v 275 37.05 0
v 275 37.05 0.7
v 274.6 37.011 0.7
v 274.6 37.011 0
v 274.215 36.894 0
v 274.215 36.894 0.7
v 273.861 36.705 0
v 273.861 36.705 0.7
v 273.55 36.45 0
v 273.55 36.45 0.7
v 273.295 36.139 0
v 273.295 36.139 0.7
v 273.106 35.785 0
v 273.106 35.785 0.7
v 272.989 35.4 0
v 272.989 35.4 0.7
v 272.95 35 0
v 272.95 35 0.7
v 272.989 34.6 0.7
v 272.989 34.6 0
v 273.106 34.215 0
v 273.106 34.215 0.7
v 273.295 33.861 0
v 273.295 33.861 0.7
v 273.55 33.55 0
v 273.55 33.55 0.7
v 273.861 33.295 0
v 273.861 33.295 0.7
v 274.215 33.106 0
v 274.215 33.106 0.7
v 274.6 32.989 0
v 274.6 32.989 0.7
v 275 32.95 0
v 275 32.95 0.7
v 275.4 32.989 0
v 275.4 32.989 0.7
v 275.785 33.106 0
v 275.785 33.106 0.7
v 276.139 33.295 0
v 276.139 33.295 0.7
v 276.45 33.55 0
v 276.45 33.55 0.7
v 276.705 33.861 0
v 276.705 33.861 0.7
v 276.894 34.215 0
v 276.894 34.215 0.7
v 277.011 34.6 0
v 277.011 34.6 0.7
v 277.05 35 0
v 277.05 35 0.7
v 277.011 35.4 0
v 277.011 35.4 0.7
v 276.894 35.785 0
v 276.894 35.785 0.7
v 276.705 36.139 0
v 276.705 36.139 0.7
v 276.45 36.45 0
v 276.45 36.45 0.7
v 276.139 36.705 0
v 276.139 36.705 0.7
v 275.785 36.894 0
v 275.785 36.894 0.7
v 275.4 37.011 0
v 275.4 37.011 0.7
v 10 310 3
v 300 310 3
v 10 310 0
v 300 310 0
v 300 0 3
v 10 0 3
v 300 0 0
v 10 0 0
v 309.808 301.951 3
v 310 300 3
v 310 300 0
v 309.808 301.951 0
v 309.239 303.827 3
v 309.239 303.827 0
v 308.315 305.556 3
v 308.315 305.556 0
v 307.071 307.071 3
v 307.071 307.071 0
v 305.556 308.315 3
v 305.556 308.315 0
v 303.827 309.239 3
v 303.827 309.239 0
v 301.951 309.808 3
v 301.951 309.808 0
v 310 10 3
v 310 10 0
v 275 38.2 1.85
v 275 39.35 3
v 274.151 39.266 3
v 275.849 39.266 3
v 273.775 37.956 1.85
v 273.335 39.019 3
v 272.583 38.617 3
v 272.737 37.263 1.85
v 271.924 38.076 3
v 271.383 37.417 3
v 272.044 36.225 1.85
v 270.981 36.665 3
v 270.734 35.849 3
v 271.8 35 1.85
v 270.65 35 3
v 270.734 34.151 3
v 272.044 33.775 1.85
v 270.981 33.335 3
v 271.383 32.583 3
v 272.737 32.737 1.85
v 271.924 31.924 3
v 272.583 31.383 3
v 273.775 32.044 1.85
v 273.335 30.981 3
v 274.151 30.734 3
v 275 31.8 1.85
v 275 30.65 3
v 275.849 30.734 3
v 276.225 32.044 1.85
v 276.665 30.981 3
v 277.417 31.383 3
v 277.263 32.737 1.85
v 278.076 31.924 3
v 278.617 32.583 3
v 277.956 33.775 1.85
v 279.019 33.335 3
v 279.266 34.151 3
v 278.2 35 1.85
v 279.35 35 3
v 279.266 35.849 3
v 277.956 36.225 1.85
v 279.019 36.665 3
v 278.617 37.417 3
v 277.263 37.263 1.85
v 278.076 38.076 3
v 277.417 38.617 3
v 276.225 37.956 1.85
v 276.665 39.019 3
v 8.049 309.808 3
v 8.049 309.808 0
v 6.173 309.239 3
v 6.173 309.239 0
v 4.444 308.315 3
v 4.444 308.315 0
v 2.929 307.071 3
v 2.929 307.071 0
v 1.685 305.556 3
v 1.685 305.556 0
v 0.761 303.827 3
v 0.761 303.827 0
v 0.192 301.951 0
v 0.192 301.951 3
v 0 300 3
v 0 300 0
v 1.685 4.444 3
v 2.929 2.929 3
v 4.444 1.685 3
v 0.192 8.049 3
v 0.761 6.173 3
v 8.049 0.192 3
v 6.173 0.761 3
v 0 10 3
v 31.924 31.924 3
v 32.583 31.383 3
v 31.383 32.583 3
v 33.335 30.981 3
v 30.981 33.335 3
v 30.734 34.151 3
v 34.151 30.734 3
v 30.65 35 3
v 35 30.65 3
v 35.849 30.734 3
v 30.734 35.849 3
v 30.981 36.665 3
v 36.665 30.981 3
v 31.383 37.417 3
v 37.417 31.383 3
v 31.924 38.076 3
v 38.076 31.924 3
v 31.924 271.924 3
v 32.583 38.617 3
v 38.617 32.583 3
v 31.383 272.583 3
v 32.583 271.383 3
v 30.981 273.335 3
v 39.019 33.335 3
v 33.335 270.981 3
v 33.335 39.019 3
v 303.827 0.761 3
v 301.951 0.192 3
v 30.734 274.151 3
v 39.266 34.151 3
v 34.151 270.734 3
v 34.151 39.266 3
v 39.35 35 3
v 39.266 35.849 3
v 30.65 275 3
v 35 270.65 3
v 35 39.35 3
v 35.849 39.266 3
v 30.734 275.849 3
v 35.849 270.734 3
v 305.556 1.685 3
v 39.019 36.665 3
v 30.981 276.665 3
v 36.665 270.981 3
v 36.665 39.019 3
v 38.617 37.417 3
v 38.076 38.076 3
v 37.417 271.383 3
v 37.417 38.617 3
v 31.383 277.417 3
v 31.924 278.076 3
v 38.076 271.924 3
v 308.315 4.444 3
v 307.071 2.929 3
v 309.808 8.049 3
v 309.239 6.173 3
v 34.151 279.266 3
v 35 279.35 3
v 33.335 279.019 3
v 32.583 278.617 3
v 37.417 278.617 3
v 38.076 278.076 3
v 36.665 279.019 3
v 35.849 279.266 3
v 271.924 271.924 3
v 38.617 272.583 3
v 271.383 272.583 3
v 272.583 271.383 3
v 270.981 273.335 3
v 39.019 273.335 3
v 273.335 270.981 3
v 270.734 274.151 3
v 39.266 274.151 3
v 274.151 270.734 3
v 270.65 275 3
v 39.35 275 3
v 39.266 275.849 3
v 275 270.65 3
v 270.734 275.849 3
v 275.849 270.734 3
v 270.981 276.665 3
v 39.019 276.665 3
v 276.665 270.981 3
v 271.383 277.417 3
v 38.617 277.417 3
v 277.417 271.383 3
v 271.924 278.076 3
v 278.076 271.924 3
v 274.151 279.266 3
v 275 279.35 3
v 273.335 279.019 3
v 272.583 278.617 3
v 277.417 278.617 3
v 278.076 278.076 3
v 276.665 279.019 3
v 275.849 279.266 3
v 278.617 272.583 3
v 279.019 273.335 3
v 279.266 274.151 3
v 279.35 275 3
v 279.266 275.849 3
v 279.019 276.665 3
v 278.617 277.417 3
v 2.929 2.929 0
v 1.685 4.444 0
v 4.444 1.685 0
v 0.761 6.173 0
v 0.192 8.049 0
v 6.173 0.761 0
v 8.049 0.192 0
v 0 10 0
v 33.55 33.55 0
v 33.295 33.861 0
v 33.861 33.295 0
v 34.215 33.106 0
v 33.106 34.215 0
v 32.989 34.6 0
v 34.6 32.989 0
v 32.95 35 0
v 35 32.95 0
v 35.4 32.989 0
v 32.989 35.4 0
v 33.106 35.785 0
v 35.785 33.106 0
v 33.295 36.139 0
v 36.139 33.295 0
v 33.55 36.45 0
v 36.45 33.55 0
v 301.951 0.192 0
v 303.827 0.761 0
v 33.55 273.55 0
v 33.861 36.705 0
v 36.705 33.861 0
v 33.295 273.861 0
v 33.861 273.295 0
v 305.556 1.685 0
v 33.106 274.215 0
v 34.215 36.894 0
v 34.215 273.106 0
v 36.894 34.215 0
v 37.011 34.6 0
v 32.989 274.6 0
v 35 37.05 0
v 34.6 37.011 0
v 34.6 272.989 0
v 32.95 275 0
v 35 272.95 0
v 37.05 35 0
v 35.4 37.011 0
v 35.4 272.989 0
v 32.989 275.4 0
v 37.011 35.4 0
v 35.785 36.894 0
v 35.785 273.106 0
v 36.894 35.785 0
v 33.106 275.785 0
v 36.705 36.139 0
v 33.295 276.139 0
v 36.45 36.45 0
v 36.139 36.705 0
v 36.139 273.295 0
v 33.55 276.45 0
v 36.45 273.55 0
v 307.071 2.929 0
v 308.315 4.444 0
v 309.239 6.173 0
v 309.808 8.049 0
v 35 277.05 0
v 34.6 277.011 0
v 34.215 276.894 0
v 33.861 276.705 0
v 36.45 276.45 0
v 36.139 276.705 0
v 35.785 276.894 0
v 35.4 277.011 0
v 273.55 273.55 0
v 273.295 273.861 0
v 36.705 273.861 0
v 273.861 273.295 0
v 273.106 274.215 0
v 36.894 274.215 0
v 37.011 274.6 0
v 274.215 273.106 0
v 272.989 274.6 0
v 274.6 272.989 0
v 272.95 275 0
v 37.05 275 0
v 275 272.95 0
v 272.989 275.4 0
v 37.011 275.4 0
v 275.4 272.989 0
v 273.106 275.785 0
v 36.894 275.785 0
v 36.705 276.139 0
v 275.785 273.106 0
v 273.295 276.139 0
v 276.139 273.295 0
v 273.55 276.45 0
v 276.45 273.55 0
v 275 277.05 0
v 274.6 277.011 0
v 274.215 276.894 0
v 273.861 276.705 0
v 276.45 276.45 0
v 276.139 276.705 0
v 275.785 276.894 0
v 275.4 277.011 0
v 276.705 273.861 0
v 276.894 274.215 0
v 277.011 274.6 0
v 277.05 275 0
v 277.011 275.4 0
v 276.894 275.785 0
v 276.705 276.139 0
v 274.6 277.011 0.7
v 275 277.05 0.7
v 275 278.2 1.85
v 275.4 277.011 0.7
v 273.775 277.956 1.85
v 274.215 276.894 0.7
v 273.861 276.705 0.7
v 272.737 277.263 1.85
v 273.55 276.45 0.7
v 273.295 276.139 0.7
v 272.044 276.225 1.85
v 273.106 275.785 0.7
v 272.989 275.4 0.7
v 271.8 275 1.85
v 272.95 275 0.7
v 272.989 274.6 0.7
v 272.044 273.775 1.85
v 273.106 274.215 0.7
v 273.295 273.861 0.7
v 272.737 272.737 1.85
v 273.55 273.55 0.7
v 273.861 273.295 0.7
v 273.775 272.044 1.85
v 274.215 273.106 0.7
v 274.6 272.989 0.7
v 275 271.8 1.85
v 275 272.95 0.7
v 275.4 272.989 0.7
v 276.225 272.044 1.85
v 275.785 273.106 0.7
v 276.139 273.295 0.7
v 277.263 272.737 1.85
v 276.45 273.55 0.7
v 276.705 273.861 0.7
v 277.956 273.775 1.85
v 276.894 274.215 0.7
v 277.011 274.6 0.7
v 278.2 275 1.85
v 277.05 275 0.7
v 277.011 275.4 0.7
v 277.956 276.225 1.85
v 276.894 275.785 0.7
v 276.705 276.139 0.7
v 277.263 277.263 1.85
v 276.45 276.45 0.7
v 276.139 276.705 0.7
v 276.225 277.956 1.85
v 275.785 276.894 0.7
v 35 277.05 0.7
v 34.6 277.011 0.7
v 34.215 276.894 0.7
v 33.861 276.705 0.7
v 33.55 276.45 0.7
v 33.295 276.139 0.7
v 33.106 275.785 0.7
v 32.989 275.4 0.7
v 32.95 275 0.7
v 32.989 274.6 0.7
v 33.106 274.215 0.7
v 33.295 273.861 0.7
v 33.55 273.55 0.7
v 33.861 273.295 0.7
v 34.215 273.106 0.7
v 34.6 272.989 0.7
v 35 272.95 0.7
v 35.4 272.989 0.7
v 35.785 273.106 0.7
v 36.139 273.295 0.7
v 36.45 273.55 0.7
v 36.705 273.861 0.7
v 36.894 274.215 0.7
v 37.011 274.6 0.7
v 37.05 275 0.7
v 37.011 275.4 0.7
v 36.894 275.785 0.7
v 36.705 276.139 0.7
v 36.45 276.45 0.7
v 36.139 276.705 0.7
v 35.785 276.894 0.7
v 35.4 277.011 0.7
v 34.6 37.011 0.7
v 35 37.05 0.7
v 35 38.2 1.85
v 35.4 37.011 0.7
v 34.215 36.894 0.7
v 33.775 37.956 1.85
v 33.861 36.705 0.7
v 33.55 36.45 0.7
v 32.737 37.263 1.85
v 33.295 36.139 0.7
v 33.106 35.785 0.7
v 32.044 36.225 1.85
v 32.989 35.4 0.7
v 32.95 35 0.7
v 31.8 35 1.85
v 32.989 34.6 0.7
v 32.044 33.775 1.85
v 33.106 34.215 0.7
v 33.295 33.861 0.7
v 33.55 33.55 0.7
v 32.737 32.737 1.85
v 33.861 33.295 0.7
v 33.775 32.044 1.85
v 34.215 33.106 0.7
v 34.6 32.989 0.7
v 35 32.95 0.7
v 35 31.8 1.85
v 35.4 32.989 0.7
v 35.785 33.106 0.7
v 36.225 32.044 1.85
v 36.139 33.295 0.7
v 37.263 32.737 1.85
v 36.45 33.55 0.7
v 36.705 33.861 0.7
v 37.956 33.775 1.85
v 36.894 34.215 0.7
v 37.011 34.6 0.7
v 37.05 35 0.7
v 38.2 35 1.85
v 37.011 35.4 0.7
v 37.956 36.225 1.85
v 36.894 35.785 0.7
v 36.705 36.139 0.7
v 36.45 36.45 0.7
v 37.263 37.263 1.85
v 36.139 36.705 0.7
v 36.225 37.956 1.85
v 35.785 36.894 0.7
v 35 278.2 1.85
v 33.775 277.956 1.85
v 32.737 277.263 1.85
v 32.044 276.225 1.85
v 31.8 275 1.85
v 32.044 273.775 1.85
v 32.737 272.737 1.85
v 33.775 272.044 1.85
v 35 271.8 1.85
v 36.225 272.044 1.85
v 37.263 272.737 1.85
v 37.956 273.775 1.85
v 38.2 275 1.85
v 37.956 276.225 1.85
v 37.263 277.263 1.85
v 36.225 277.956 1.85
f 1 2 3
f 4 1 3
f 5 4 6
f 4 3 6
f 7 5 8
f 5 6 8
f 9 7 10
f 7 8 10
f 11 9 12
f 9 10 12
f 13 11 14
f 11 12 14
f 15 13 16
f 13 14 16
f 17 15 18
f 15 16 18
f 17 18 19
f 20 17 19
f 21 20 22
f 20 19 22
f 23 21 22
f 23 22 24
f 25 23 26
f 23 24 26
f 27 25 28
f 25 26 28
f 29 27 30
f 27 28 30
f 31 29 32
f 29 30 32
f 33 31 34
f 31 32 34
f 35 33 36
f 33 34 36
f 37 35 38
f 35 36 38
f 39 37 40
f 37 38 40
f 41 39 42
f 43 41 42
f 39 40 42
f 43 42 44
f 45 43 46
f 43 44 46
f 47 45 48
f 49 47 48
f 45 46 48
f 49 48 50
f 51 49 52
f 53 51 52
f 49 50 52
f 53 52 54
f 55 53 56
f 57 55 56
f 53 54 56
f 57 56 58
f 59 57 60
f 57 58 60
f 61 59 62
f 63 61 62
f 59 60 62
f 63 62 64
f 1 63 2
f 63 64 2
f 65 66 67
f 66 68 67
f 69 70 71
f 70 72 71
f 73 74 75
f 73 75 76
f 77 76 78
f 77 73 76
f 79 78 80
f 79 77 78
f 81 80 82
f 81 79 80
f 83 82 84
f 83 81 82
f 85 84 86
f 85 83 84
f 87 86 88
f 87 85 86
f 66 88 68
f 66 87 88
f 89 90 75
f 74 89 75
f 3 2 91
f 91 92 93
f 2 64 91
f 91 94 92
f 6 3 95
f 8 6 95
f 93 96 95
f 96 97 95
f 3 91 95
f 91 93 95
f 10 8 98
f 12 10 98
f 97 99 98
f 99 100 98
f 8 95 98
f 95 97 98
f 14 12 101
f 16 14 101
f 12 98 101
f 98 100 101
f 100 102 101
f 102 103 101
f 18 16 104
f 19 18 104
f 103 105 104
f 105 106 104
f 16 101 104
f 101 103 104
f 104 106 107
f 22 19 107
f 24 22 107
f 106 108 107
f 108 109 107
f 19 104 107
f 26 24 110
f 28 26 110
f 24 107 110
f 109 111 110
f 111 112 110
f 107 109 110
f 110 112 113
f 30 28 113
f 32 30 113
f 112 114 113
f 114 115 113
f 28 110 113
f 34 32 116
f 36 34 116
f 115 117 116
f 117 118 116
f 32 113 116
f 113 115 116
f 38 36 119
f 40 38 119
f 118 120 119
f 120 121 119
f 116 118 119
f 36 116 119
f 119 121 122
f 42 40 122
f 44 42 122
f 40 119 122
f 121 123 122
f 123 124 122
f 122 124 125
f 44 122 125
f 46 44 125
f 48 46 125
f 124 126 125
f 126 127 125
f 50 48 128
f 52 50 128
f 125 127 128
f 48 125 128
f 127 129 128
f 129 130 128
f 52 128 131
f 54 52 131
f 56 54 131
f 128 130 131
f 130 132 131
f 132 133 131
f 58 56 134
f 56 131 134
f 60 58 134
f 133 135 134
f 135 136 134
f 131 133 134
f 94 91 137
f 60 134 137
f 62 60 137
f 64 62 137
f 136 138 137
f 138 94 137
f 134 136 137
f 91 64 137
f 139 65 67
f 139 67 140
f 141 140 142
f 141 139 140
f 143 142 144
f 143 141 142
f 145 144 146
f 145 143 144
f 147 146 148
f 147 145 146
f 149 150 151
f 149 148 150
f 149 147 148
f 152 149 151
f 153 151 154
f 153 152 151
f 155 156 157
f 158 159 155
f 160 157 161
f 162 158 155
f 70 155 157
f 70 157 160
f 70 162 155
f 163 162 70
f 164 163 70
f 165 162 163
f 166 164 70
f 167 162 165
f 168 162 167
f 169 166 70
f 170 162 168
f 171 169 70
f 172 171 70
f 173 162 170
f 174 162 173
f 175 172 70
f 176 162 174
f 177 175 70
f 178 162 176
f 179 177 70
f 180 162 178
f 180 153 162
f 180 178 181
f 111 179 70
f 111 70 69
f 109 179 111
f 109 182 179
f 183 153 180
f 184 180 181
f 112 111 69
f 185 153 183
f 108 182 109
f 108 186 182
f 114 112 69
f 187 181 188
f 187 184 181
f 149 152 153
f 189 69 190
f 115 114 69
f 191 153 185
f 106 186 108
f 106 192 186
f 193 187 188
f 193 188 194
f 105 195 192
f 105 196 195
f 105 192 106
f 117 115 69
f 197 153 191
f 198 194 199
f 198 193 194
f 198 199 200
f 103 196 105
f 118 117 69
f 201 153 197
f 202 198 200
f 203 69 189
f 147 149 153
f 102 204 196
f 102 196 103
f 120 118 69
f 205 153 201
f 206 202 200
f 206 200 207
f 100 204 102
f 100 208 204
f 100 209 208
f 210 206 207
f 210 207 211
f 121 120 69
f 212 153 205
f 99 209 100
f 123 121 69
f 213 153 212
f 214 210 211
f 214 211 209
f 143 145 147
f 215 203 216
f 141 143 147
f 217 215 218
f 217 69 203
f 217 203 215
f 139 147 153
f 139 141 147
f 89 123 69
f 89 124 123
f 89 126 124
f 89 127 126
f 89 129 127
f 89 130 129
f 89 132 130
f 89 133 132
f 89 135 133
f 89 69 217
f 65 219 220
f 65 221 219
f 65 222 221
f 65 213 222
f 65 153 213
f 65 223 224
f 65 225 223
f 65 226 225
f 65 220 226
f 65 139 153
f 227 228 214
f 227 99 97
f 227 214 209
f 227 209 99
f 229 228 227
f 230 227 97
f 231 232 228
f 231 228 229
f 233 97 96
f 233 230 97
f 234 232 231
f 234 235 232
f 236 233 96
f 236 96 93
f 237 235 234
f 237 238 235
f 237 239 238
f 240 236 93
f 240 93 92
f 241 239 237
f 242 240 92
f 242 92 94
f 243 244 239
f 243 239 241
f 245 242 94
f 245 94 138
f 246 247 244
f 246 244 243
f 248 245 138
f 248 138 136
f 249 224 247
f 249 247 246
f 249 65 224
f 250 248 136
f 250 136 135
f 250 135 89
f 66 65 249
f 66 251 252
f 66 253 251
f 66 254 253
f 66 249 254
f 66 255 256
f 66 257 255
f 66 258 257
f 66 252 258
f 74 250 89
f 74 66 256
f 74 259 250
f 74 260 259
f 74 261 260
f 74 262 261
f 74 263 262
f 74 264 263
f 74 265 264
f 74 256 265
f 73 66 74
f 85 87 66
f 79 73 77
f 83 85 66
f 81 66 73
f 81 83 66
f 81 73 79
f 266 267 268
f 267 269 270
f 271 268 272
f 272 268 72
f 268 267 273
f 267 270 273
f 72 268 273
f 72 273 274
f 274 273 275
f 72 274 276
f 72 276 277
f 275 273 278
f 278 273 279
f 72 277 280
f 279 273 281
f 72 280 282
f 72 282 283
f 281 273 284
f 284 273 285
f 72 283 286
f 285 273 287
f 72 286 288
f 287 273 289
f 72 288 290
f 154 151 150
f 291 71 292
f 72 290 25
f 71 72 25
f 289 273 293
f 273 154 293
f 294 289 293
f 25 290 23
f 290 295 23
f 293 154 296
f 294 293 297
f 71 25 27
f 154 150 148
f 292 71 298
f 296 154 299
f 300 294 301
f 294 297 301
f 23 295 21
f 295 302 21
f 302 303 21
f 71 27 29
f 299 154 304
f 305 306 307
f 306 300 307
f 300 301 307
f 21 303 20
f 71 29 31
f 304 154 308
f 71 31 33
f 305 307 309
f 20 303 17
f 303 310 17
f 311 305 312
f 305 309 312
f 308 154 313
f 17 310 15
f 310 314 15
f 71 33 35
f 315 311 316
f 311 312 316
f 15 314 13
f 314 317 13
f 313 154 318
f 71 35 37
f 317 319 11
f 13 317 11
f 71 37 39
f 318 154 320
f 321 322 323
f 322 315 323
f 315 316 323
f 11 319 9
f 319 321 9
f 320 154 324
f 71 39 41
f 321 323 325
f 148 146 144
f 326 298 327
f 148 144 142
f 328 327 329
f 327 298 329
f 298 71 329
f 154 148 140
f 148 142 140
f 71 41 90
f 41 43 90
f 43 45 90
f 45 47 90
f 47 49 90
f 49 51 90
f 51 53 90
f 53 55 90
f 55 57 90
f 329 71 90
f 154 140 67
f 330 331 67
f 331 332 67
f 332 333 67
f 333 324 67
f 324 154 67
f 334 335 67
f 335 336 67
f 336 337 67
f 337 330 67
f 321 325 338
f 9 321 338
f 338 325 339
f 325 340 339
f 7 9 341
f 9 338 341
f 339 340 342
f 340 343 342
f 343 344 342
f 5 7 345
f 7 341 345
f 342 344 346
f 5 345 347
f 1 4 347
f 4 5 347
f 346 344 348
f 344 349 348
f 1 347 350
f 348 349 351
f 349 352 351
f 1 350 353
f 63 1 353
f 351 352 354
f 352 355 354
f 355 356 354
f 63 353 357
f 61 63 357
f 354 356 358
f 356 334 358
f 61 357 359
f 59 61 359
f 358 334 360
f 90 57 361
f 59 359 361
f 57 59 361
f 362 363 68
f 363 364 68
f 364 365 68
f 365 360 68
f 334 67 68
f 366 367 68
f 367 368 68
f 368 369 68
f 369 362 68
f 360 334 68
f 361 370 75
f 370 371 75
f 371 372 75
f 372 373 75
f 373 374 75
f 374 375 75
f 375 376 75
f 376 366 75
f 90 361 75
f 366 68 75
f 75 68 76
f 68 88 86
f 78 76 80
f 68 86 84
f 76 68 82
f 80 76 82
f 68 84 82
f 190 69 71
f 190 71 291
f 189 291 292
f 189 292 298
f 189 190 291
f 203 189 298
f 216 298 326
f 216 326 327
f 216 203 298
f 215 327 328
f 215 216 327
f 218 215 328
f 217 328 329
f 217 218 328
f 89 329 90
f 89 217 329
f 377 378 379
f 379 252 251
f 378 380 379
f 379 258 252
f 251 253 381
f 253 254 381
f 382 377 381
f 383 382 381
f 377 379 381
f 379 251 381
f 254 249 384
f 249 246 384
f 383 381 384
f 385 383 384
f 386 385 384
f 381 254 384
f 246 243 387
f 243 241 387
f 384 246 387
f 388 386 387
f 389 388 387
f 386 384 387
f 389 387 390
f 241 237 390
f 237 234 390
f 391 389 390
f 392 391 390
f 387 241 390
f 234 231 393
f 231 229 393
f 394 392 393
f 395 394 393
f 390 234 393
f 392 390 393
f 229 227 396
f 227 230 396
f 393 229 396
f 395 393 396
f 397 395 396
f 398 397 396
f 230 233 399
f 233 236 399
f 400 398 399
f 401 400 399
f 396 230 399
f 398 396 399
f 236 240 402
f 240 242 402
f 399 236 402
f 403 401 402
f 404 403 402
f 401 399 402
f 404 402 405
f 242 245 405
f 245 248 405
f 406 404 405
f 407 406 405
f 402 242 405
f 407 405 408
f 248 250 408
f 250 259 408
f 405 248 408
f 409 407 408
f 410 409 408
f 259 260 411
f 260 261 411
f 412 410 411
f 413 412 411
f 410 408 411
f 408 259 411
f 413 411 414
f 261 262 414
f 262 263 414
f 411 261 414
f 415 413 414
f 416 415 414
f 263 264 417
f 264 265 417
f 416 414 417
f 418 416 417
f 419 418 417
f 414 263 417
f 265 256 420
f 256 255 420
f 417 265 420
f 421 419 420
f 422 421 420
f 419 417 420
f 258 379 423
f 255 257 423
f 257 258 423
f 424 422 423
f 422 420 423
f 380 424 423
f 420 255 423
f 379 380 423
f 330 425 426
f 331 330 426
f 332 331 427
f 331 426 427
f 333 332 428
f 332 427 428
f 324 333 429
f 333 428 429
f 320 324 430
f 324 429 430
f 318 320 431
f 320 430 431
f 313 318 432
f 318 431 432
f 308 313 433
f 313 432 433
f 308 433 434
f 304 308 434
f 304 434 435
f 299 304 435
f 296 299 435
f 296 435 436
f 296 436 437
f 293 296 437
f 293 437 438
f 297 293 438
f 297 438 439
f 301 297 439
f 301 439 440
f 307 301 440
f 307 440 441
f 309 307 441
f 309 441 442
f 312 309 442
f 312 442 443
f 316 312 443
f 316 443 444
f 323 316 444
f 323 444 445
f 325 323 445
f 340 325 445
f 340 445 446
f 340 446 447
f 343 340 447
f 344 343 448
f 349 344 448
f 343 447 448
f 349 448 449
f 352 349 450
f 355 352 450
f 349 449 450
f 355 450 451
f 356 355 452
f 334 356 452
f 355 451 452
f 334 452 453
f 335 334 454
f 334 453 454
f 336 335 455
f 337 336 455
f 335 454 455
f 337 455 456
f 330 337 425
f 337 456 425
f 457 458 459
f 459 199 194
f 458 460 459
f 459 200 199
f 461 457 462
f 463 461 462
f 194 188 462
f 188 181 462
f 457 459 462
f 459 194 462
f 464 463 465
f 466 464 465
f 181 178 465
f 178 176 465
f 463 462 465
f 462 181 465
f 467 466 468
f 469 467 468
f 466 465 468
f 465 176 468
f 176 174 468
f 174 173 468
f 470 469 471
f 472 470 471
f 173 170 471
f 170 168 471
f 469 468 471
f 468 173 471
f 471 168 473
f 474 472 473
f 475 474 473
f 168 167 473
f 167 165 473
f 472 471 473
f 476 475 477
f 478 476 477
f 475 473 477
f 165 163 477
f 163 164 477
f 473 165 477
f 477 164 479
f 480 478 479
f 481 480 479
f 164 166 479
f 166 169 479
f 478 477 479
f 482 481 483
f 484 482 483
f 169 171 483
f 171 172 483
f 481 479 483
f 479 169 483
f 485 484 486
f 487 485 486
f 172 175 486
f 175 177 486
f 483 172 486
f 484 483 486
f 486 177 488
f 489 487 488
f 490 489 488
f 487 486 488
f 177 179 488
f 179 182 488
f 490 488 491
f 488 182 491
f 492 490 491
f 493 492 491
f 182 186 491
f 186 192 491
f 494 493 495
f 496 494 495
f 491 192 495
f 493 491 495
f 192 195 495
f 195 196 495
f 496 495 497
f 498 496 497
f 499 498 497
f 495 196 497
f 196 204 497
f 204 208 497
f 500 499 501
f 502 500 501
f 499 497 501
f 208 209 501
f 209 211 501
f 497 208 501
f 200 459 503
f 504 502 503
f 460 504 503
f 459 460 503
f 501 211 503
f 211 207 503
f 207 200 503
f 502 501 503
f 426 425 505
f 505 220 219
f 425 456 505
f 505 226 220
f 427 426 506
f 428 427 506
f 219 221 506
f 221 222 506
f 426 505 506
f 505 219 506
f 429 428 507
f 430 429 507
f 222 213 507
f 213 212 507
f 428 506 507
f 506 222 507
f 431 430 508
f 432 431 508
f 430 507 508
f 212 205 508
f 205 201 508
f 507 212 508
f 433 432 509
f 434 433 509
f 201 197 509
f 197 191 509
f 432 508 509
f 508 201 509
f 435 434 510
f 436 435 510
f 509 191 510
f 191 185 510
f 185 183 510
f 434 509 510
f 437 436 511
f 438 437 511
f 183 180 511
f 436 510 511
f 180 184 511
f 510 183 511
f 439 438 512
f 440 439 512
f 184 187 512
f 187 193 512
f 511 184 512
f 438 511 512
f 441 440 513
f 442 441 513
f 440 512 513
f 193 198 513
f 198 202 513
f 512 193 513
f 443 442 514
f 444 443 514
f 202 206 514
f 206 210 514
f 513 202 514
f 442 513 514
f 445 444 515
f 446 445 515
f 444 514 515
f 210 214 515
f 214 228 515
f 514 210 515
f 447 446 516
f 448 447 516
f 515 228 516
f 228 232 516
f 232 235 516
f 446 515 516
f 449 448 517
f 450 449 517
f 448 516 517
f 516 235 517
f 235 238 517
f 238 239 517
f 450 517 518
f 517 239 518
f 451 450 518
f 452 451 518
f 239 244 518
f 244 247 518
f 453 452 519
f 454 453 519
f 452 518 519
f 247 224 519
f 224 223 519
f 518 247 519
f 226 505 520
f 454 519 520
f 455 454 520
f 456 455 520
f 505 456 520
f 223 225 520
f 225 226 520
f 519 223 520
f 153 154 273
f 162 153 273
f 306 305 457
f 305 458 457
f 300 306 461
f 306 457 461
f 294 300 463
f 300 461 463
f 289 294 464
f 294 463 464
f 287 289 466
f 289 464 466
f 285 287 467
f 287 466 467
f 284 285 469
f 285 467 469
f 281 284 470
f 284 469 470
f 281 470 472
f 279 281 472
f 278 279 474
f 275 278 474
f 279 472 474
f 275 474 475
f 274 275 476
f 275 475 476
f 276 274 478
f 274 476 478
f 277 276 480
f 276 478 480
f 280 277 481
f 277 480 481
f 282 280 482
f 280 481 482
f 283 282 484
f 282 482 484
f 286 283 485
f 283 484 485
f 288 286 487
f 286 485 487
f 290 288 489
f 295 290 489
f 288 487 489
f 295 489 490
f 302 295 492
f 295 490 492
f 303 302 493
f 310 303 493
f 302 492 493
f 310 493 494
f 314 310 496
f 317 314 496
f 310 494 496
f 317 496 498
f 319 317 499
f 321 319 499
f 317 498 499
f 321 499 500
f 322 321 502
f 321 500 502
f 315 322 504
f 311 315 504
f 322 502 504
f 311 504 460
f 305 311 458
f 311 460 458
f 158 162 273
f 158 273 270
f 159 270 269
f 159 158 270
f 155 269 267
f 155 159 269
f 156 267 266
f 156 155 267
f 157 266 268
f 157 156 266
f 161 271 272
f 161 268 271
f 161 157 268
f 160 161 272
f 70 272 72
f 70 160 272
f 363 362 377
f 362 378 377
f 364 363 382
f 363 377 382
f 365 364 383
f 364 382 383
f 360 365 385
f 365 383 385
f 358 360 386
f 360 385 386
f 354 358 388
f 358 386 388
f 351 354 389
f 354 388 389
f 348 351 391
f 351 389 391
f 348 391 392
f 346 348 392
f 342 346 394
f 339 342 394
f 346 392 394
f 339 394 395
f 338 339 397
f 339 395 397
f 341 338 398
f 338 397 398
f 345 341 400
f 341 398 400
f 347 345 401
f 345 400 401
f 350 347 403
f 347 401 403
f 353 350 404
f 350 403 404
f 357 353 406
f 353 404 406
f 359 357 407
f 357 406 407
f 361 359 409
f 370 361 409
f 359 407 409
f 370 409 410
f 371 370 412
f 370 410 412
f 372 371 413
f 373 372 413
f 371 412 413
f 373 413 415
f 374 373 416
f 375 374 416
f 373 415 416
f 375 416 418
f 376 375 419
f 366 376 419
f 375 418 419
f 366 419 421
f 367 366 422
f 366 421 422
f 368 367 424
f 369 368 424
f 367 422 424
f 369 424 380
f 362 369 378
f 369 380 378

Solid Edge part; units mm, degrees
sketch "Sketch1" plane through (0, 0, 0) normal (0, 0, 1) x (1, 0, 0)
  line L0 (0, 0) -> (310, 0)
  line L1 (310, 0) -> (310, 310)
  line L2 (310, 310) -> (0, 310)
  line L3 (0, 310) -> (0, 0)
  dimension "D1" = 310
extrude "Protrusion1" add sketch "Sketch1" along normal blind 3
sketch "Sketch2" plane through (155, 155, 3) normal (0, 0, 1) x (0, 1, 0)
  circle A0 centre (-120, 120) radius 2.05
  dimension "D1" = 4.1
  dimension "D2" = 35
  dimension "D3" = 35
extrude "Cutout1" cut sketch "Sketch2" against normal up to next
pattern_linear "Pattern1" count 2 spacing 240 along (0, 1, 0) count 2 spacing 240 along (1, 0, 0) of "Cutout1"
chamfer "Chamfer_1" distance 2.3 angle 45 4 edges at (35, 272.95, 3) (35, 32.95, 3) (275, 32.95, 3) (275, 272.95, 3)
fillet "Round_1" radius 10 4 edges at (310, 0, 1.5) (310, 310, 1.5) (0, 0, 1.5) (0, 310, 1.5)
properties material "Aluminum, 1060"
